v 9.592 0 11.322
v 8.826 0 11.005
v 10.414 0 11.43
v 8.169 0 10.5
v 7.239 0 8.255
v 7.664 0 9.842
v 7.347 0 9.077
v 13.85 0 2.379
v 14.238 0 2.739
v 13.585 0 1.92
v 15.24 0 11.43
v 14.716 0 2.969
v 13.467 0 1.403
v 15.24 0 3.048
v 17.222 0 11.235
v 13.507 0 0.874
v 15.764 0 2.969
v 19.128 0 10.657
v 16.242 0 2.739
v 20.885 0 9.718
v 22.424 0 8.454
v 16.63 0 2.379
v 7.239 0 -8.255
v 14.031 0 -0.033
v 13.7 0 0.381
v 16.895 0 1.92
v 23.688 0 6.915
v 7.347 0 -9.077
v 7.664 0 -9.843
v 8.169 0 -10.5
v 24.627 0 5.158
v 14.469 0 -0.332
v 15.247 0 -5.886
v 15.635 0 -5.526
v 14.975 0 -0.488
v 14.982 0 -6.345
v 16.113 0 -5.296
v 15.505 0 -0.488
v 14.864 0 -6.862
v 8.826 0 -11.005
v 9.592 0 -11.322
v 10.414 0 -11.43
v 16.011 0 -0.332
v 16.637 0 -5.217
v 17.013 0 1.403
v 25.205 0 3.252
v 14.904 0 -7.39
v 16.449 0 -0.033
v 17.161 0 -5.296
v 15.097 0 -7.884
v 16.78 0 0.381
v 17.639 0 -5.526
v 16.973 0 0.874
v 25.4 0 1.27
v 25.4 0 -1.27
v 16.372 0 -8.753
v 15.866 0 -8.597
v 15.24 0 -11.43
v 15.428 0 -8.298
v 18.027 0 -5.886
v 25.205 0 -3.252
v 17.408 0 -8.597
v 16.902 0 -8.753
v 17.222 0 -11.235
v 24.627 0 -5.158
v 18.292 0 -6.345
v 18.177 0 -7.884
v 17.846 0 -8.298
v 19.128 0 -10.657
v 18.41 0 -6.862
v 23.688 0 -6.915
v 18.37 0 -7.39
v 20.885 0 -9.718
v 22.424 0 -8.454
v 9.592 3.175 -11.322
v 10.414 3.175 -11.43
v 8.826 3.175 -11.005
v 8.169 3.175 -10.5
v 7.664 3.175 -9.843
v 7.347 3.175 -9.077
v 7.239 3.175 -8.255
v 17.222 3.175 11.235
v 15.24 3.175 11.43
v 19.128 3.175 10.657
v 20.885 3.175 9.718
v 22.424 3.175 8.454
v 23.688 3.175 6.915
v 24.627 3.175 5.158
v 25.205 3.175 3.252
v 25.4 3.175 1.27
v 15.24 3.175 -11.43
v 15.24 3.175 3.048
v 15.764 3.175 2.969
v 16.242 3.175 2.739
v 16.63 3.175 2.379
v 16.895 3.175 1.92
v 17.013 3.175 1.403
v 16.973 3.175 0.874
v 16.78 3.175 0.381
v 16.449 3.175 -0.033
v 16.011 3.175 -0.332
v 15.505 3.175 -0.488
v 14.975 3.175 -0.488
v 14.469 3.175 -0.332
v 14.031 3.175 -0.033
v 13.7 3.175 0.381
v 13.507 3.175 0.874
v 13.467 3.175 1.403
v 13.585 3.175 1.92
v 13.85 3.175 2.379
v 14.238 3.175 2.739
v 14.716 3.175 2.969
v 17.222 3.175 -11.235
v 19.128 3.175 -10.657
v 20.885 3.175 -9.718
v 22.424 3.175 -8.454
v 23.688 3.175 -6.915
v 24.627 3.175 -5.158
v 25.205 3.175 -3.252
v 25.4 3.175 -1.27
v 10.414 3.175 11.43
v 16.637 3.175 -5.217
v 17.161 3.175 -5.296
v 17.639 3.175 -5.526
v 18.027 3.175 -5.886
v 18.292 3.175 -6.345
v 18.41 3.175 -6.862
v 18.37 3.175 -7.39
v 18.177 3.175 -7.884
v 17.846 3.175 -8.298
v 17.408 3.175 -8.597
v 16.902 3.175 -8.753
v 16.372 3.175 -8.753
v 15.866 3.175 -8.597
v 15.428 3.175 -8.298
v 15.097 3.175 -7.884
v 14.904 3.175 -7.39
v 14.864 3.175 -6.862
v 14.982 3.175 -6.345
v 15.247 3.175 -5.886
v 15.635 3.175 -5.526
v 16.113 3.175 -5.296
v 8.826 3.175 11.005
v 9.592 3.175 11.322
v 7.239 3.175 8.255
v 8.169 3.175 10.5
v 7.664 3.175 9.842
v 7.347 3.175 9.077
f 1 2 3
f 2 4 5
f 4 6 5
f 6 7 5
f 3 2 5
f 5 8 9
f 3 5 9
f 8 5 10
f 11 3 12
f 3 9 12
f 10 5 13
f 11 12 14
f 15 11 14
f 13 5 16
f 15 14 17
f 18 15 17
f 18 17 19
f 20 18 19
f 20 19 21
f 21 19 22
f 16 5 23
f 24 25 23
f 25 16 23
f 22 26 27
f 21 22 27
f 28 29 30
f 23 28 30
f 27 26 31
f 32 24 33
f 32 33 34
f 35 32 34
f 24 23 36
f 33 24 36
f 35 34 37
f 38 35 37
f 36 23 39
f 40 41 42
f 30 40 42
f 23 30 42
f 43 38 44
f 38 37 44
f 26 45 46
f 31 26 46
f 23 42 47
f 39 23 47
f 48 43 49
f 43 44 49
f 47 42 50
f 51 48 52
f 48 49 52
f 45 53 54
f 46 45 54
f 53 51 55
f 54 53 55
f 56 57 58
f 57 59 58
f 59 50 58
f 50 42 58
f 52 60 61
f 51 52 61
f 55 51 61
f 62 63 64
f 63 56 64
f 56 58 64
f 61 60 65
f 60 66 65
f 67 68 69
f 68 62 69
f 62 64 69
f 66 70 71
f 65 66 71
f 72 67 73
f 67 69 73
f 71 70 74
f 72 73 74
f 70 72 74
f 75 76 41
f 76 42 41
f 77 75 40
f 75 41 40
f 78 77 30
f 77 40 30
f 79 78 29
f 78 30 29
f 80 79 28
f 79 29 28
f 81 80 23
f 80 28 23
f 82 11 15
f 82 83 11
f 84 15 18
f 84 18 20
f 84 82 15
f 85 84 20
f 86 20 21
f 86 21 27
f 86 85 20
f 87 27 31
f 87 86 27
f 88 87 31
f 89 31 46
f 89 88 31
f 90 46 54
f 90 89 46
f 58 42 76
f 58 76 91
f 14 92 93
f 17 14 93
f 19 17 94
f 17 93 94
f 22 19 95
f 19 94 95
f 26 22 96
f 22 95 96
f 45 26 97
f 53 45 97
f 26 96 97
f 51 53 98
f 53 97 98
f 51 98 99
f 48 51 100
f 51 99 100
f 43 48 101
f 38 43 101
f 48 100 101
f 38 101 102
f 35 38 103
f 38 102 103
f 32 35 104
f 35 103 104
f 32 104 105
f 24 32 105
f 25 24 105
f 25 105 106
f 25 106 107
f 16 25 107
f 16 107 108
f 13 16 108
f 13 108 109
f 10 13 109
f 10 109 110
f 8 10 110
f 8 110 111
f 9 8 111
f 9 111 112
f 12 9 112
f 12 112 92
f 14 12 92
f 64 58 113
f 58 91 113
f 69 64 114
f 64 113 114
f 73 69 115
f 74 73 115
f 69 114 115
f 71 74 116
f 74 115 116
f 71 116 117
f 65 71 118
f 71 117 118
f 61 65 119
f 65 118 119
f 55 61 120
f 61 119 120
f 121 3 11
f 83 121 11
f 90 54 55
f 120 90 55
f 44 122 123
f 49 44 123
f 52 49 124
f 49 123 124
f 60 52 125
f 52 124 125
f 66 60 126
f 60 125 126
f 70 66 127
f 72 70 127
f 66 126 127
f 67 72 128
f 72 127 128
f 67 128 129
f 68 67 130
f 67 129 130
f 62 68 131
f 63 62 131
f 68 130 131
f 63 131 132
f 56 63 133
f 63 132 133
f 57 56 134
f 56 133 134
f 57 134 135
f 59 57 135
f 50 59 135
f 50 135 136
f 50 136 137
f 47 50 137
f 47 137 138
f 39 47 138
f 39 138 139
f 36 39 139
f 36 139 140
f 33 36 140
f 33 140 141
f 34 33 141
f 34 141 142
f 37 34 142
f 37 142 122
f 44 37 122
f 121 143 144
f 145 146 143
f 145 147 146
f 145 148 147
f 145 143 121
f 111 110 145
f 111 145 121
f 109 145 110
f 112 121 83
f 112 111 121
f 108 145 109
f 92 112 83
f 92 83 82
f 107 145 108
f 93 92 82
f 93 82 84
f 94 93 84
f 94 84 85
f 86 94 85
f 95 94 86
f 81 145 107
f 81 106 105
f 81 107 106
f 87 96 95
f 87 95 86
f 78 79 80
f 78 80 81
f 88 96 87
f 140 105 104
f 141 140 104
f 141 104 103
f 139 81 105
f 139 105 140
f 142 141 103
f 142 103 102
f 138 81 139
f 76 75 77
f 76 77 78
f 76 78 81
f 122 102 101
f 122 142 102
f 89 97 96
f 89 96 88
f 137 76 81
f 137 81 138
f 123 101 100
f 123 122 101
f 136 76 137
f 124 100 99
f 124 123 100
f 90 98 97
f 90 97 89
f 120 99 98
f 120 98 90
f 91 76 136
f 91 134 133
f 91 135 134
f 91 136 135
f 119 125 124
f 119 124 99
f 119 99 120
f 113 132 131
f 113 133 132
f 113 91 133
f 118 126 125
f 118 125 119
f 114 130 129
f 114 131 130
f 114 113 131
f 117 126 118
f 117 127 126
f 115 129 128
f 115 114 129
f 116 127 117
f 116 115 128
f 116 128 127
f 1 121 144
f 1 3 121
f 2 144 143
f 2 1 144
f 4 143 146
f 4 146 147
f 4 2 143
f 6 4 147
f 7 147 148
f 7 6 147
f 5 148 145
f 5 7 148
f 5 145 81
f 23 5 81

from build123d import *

# Parameters (mm, degrees)
SKETCH1_W           = 50.8
SKETCH1_H           = 22.86
BOSS_EXTRUDE1_DEPTH = 3.175
FILLET1_R           = 10.16
SKETCH3_R           = 1.778
CUT_EXTRUDE1_DEPTH  = 29.033649869
FILLET3_R           = 10.16
SKETCH4_W           = 32.639
SKETCH4_H           = 22.86
CUT_EXTRUDE2_DEPTH  = 29.033649869
FILLET9_R           = 3.175


with BuildPart() as part:
    # Sketch1 → Boss-Extrude1 (new body)
    with BuildSketch(Plane(origin=(0, 0, 0), x_dir=(1, 0, 0), z_dir=(0, 1, 0))):
        Rectangle(SKETCH1_W, SKETCH1_H)
    extrude(amount=BOSS_EXTRUDE1_DEPTH)

    # Fillet1
    fillet1_edges = [part.edges().sort_by_distance(p)[0] for p in [
        (25.4, 1.5875, 11.43),
        (-25.4, 1.5875, 11.43),
    ]]
    fillet(fillet1_edges, radius=FILLET1_R)

    # Sketch3 → Cut-Extrude1 (cut, through all)
    with BuildSketch(Plane(origin=(0, 3.175, 0), x_dir=(1, 0, 0), z_dir=(0, 1, 0))):
        with Locations(Location((15.24, -1.27, 0), (0, 0, 270))):
            Circle(SKETCH3_R)
        with Locations(Location((16.637, 6.994763457, 0), (0, 0, 270))):
            Circle(SKETCH3_R)
        with Locations(Location((-3.81, -1.27, 0), (0, 0, 270))):
            Circle(SKETCH3_R)
    extrude(amount=-CUT_EXTRUDE1_DEPTH, mode=Mode.SUBTRACT)

    # Fillet3
    fillet3_edges = [part.edges().sort_by_distance(p)[0] for p in [
        (-25.4, 1.5875, -11.43),
        (25.4, 1.5875, -11.43),
    ]]
    fillet(fillet3_edges, radius=FILLET3_R)

    # Sketch4 → Cut-Extrude2 (cut, through all)
    with BuildSketch(Plane(origin=(0, 3.175, 0), x_dir=(1, 0, 0), z_dir=(0, 1, 0))):
        with Locations((-9.0805, 0)):
            Rectangle(SKETCH4_W, SKETCH4_H)
    extrude(amount=-CUT_EXTRUDE2_DEPTH, mode=Mode.SUBTRACT)

    # Fillet9
    fillet9_edges = [part.edges().sort_by_distance(p)[0] for p in [
        (7.239, 1.5875, -11.43),
        (7.239, 1.5875, 11.43),
    ]]
    fillet(fillet9_edges, radius=FILLET9_R)


solid = part.part
